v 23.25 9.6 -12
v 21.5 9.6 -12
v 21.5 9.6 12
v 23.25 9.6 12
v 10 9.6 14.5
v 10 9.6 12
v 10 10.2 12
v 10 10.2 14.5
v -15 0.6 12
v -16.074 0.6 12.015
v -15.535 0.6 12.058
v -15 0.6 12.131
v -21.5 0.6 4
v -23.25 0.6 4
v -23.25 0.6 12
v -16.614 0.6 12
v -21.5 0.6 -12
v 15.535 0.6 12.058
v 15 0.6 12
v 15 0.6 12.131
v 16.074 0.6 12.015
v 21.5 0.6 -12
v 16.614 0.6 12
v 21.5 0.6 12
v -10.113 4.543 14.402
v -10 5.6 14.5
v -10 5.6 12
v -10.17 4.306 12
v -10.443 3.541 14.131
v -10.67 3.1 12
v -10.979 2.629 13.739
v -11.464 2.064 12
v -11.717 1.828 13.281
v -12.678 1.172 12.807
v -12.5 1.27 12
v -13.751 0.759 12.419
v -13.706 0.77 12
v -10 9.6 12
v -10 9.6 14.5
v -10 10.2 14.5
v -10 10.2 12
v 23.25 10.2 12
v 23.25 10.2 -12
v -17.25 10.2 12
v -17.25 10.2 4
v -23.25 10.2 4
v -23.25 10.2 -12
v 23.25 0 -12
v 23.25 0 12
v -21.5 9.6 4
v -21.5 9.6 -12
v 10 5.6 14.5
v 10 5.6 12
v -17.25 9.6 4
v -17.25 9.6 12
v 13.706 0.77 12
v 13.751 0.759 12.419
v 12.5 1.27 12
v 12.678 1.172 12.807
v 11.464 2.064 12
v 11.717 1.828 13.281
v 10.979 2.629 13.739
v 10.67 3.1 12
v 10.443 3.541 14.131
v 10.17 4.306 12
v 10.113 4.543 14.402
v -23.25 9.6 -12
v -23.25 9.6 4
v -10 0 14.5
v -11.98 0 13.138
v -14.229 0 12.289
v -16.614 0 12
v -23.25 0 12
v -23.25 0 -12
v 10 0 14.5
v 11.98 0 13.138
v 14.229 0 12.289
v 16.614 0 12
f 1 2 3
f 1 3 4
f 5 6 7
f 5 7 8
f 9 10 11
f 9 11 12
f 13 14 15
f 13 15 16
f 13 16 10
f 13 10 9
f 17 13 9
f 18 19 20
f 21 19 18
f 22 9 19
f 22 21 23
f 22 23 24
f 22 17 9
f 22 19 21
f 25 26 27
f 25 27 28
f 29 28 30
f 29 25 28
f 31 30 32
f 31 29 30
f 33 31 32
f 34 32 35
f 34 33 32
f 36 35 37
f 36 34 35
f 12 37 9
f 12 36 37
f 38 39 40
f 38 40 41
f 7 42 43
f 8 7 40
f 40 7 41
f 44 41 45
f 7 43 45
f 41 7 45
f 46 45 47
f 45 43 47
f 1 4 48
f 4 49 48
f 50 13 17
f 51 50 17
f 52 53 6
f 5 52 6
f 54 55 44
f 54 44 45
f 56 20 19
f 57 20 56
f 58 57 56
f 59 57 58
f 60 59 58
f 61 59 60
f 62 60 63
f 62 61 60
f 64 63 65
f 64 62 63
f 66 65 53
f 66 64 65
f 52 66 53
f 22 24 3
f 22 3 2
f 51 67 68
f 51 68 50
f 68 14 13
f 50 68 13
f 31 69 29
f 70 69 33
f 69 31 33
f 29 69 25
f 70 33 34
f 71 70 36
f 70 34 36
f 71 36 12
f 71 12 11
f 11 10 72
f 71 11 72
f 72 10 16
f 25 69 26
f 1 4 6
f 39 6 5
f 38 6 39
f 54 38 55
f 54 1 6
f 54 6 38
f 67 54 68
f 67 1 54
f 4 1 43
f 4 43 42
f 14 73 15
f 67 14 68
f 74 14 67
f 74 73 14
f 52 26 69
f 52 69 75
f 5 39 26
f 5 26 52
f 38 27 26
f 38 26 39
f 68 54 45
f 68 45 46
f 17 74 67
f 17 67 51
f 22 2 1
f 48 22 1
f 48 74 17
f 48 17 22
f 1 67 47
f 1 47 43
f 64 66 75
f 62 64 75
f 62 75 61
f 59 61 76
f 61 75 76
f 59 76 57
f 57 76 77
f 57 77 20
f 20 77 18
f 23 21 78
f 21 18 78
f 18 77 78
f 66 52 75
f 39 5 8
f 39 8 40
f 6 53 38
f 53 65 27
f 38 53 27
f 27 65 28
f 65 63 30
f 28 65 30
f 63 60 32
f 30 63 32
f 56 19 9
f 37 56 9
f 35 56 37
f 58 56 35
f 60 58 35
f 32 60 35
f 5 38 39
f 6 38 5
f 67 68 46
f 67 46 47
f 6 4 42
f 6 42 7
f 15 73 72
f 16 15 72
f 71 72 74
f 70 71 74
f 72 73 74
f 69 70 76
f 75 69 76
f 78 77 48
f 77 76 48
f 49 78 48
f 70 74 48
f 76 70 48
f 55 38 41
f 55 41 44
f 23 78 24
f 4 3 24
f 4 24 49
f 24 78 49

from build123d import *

# Parameters (mm, degrees)
SKETCH6_W            = 46.5
SKETCH6_H            = 24
BOSS_EXTRUDE4_DEPTH  = 0.6
SKETCH7_W            = 1.75
SKETCH7_H            = 24
SKETCH7_H_2          = 16
BOSS_EXTRUDE5_DEPTH  = 9
SKETCH8_W            = 20
SKETCH8_H            = 9.6
BOSS_EXTRUDE6_DEPTH  = 2.5
FILLET1_R            = 10
FILLET2_R            = 5
BOSS_EXTRUDE12_DEPTH = 0.6


with BuildPart() as part:
    # Sketch6 → Boss-Extrude4 (new body)
    with BuildSketch(Plane(origin=(0, 0, 0), x_dir=(1, 0, 0), z_dir=(0, 1, 0))):
        Rectangle(SKETCH6_W, SKETCH6_H)
    extrude(amount=BOSS_EXTRUDE4_DEPTH)

    # Sketch7 → Boss-Extrude5 (add)
    with BuildSketch(Plane(origin=(0, 0.6, 0), x_dir=(1, 0, 0), z_dir=(0, 1, 0))):
        with Locations((22.375, 0)):
            Rectangle(SKETCH7_W, SKETCH7_H)
        with Locations((-22.375, 4)):
            Rectangle(SKETCH7_W, SKETCH7_H_2)
    extrude(amount=BOSS_EXTRUDE5_DEPTH)

    # Sketch8 → Boss-Extrude6 (add)
    with BuildSketch(Plane.XY.offset(12)):
        with Locations((0, 4.8)):
            Rectangle(SKETCH8_W, SKETCH8_H)
    extrude(amount=BOSS_EXTRUDE6_DEPTH)

    # Fillet1
    # the kernel refuses this fillet: 10 mm, written as the material it adds along each edge
    with BuildSketch(Plane(origin=(-10, 0.6, 12), x_dir=(-1, 0, 0), z_dir=(0, -1, 0)), Plane(origin=(10, 0, 12), x_dir=(1, 0, 0), z_dir=(0, 1, 0))) as fillet1_piece_1:
        with BuildLine():
            CenterArc((6.614378278, -10), FILLET1_R, 90, 41.409622109)
            Line((0, -2.5), (0, 0))
            Line((0, 0), (6.614378278, 0))
        make_face()
    extrude(amount=0.6)

    # Fillet2
    # the kernel refuses this fillet: 5 mm, written as the material it adds along each edge
    with BuildSketch(Plane(origin=(-10, 0.6, 27), x_dir=(-1, 0, 0), z_dir=(0, 0, -1))) as fillet2_piece_1_section:
        with BuildLine():
            CenterArc((FILLET2_R, FILLET2_R), FILLET2_R, 180, 90)
            Line((0, FILLET2_R), (0, 0))
            Line((0, 0), (FILLET2_R, 0))
        make_face()
    fillet2_piece_1 = extrude(amount=15, mode=Mode.PRIVATE)
    fillet2_piece_1 = fillet2_piece_1 - Plane(origin=(-16.614378278, 1.904105076, 22), x_dir=(-1, 0, 0), z_dir=(0, 1, 0)) * Cylinder(10, 50, mode=Mode.PRIVATE)
    add(fillet2_piece_1)
    with BuildSketch(Plane(origin=(10, 0.6, 27), x_dir=(1, 0, 0), z_dir=(0, 0, -1))) as fillet2_piece_2_section:
        with BuildLine():
            CenterArc((FILLET2_R, -FILLET2_R), FILLET2_R, 90, 90)
            Line((0, -FILLET2_R), (0, 0))
            Line((0, 0), (FILLET2_R, 0))
        make_face()
    fillet2_piece_2 = extrude(amount=15, mode=Mode.PRIVATE)
    fillet2_piece_2 = fillet2_piece_2 - Plane(origin=(16.614378278, 1.904105076, 22), x_dir=(1, 0, 0), z_dir=(0, -1, 0)) * Cylinder(10, 50, mode=Mode.PRIVATE)
    add(fillet2_piece_2)


with BuildPart() as body_2:
    # Sketch10 → Boss-Extrude12 (new body)
    with BuildSketch(Plane(origin=(0, 9.6, 0), x_dir=(1, 0, 0), z_dir=(0, 1, 0))):
        Polygon((-23.25, 12), (23.25, 12), (23.25, -12), (10, -12), (10, -14.5), (-10, -14.5), (-10, -12), (-17.25, -12), (-17.25, -4), (-23.25, -4), align=None)
    extrude(amount=BOSS_EXTRUDE12_DEPTH)


solid = Compound([part.part, body_2.part])
